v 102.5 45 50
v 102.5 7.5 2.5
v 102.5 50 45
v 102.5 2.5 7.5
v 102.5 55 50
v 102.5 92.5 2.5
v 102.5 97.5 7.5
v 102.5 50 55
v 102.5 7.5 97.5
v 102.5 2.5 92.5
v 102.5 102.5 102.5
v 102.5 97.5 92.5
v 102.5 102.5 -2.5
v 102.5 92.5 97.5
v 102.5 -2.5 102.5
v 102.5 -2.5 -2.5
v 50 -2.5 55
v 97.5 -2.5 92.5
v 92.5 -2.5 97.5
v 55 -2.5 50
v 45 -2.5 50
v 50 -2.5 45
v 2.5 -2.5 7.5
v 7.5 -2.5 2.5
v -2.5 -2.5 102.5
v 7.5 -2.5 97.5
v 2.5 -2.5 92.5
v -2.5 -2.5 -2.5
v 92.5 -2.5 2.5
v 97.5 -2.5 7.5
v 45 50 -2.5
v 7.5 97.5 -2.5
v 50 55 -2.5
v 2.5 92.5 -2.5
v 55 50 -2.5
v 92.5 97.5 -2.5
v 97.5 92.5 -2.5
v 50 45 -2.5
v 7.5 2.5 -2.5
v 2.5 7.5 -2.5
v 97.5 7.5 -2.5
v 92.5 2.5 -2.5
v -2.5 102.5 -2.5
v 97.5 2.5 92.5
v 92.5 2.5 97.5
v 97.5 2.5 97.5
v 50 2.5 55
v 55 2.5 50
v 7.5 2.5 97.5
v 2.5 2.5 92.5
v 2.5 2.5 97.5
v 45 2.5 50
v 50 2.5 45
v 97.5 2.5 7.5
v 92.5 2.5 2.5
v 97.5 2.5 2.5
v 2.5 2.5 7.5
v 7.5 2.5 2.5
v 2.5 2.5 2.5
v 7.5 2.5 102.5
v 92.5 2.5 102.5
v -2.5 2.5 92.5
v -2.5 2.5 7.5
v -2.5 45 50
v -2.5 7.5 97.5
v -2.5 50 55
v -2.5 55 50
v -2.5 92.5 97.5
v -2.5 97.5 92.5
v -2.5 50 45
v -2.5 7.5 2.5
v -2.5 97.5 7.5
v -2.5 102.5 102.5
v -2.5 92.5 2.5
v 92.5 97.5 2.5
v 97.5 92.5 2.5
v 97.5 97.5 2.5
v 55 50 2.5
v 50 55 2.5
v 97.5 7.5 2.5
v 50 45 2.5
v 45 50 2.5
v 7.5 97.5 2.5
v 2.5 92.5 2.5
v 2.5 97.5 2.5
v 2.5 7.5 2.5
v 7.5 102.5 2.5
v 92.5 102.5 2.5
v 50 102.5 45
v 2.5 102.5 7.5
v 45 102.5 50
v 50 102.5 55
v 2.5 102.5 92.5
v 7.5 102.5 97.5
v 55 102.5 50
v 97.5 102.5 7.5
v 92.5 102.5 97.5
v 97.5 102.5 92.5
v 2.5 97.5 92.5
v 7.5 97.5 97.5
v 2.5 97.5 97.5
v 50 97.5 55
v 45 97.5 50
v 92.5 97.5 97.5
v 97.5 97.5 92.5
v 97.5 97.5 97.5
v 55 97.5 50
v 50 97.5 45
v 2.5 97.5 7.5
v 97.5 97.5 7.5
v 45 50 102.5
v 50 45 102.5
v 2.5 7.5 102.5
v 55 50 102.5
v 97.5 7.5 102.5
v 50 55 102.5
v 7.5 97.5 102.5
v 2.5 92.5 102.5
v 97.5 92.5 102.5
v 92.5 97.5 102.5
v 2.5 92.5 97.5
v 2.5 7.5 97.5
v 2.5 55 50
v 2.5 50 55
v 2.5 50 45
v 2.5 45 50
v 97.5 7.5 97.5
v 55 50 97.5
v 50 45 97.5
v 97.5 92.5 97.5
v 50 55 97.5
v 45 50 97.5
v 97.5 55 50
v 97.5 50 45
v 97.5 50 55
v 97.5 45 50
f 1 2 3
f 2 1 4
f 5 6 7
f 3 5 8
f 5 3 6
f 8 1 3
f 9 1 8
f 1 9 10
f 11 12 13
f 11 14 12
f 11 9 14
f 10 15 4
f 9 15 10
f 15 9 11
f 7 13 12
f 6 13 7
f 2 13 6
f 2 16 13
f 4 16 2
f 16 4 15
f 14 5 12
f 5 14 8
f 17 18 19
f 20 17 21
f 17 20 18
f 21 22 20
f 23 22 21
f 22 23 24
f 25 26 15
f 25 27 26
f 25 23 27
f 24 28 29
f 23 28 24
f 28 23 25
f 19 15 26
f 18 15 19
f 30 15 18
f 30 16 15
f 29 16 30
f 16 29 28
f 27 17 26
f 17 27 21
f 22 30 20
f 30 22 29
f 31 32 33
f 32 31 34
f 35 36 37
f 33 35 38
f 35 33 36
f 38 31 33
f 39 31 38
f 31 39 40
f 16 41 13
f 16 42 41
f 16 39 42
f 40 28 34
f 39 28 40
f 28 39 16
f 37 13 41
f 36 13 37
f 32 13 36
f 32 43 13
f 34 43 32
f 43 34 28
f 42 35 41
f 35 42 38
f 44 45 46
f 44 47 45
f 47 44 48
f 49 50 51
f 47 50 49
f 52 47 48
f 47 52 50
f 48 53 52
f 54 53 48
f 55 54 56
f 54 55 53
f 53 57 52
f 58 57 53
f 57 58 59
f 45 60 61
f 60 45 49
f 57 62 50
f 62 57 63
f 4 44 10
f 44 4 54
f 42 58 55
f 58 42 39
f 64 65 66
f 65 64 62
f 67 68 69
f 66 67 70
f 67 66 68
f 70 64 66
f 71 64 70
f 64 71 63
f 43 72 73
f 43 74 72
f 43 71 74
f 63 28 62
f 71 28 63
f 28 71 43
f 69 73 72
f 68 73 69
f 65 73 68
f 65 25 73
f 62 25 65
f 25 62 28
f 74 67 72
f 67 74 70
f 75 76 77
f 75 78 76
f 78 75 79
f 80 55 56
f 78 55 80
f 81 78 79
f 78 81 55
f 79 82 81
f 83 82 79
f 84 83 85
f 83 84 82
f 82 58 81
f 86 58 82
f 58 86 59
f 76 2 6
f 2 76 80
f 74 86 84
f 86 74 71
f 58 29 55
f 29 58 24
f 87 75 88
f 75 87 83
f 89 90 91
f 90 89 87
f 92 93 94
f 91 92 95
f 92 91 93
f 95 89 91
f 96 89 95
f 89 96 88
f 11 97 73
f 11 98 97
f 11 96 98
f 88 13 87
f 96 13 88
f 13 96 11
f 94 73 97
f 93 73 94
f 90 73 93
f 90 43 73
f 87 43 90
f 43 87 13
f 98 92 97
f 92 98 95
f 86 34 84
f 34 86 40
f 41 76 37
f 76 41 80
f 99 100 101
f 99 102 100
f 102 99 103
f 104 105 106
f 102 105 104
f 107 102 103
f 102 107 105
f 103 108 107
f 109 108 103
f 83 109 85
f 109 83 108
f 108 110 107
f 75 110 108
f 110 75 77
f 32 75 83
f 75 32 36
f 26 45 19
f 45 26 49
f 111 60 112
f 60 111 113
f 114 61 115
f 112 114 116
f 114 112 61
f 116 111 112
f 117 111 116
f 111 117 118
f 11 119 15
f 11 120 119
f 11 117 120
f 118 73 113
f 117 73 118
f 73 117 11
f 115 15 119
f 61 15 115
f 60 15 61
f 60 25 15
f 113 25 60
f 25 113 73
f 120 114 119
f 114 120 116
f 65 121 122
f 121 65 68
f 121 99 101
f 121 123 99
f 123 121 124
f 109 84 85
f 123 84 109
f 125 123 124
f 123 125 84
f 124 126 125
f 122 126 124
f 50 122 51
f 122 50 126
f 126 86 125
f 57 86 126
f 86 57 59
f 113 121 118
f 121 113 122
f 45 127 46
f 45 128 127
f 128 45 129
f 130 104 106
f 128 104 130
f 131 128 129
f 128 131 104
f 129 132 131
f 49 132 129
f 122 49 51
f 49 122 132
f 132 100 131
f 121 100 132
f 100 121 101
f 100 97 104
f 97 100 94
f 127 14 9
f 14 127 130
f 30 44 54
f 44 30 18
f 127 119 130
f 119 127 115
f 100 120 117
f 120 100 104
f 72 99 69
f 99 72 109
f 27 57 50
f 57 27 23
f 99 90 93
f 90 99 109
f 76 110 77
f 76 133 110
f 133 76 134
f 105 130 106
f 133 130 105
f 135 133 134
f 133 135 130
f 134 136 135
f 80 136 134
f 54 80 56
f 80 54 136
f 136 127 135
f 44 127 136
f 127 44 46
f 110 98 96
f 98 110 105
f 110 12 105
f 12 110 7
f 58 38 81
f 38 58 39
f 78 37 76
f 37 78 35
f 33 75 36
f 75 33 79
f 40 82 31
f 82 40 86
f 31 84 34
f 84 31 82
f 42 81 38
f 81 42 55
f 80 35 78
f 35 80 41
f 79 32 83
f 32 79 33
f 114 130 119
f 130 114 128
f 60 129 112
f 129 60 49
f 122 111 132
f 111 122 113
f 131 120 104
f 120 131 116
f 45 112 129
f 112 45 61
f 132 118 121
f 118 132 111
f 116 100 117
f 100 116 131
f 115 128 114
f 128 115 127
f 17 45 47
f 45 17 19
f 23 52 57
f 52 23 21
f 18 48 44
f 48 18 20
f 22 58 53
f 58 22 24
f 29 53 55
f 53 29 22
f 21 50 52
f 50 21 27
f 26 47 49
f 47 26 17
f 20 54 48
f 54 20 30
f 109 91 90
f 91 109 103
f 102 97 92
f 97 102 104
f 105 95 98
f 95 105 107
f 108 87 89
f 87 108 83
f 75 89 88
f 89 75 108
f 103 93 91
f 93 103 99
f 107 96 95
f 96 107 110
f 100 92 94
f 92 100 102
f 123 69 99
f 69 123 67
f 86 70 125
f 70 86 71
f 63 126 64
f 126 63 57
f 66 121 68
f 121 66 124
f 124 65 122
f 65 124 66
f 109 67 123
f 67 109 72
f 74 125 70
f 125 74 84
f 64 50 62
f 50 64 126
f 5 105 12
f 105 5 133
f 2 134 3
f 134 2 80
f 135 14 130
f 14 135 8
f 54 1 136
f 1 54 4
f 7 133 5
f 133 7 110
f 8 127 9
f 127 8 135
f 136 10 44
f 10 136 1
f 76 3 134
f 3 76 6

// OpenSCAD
// Parameters for the cube truss
truss_side_length = 100; // Overall side length of the cube truss
member_thickness = 5;    // Side length of the square profile for truss members
member_color = [0.7, 0.7, 0.7, 1]; // Color of the truss members (RGBA)

// Helper module to create a square beam between two points using hull.
// This creates a beam with a square cross-section, whose ends are centered at p1 and p2.
module beam(p1, p2) {
    hull() {
        translate(p1) cube(member_thickness, center = true);
        translate(p2) cube(member_thickness, center = true);
    }
}

// Main module to generate the cube truss structure
module cube_truss() {
    // Define the 8 vertices of the cube
    // The cube starts at (0,0,0) and extends to (truss_side_length, truss_side_length, truss_side_length)
    v0 = [0, 0, 0];
    v1 = [truss_side_length, 0, 0];
    v2 = [0, truss_side_length, 0];
    v3 = [truss_side_length, truss_side_length, 0];
    v4 = [0, 0, truss_side_length];
    v5 = [truss_side_length, 0, truss_side_length];
    v6 = [0, truss_side_length, truss_side_length];
    v7 = [truss_side_length, truss_side_length, truss_side_length];

    color(member_color) {
        // Draw the 12 edges of the cube
        // Bottom face edges (Z=0)
        beam(v0, v1);
        beam(v0, v2);
        beam(v1, v3);
        beam(v2, v3);

        // Top face edges (Z=truss_side_length)
        beam(v4, v5);
        beam(v4, v6);
        beam(v5, v7);
        beam(v6, v7);

        // Vertical edges connecting bottom and top faces
        beam(v0, v4);
        beam(v1, v5);
        beam(v2, v6);
        beam(v3, v7);

        // Draw the 12 face diagonals
        // Bottom face diagonals (Z=0)
        beam(v0, v3);
        beam(v1, v2);

        // Top face diagonals (Z=truss_side_length)
        beam(v4, v7);
        beam(v5, v6);

        // Front face diagonals (Y=0)
        beam(v0, v5);
        beam(v1, v4);

        // Back face diagonals (Y=truss_side_length)
        beam(v2, v7);
        beam(v3, v6);

        // Left face diagonals (X=0)
        beam(v0, v6);
        beam(v2, v4);

        // Right face diagonals (X=truss_side_length)
        beam(v1, v7);
        beam(v3, v5);
    }
}

// Render the cube truss
cube_truss();
